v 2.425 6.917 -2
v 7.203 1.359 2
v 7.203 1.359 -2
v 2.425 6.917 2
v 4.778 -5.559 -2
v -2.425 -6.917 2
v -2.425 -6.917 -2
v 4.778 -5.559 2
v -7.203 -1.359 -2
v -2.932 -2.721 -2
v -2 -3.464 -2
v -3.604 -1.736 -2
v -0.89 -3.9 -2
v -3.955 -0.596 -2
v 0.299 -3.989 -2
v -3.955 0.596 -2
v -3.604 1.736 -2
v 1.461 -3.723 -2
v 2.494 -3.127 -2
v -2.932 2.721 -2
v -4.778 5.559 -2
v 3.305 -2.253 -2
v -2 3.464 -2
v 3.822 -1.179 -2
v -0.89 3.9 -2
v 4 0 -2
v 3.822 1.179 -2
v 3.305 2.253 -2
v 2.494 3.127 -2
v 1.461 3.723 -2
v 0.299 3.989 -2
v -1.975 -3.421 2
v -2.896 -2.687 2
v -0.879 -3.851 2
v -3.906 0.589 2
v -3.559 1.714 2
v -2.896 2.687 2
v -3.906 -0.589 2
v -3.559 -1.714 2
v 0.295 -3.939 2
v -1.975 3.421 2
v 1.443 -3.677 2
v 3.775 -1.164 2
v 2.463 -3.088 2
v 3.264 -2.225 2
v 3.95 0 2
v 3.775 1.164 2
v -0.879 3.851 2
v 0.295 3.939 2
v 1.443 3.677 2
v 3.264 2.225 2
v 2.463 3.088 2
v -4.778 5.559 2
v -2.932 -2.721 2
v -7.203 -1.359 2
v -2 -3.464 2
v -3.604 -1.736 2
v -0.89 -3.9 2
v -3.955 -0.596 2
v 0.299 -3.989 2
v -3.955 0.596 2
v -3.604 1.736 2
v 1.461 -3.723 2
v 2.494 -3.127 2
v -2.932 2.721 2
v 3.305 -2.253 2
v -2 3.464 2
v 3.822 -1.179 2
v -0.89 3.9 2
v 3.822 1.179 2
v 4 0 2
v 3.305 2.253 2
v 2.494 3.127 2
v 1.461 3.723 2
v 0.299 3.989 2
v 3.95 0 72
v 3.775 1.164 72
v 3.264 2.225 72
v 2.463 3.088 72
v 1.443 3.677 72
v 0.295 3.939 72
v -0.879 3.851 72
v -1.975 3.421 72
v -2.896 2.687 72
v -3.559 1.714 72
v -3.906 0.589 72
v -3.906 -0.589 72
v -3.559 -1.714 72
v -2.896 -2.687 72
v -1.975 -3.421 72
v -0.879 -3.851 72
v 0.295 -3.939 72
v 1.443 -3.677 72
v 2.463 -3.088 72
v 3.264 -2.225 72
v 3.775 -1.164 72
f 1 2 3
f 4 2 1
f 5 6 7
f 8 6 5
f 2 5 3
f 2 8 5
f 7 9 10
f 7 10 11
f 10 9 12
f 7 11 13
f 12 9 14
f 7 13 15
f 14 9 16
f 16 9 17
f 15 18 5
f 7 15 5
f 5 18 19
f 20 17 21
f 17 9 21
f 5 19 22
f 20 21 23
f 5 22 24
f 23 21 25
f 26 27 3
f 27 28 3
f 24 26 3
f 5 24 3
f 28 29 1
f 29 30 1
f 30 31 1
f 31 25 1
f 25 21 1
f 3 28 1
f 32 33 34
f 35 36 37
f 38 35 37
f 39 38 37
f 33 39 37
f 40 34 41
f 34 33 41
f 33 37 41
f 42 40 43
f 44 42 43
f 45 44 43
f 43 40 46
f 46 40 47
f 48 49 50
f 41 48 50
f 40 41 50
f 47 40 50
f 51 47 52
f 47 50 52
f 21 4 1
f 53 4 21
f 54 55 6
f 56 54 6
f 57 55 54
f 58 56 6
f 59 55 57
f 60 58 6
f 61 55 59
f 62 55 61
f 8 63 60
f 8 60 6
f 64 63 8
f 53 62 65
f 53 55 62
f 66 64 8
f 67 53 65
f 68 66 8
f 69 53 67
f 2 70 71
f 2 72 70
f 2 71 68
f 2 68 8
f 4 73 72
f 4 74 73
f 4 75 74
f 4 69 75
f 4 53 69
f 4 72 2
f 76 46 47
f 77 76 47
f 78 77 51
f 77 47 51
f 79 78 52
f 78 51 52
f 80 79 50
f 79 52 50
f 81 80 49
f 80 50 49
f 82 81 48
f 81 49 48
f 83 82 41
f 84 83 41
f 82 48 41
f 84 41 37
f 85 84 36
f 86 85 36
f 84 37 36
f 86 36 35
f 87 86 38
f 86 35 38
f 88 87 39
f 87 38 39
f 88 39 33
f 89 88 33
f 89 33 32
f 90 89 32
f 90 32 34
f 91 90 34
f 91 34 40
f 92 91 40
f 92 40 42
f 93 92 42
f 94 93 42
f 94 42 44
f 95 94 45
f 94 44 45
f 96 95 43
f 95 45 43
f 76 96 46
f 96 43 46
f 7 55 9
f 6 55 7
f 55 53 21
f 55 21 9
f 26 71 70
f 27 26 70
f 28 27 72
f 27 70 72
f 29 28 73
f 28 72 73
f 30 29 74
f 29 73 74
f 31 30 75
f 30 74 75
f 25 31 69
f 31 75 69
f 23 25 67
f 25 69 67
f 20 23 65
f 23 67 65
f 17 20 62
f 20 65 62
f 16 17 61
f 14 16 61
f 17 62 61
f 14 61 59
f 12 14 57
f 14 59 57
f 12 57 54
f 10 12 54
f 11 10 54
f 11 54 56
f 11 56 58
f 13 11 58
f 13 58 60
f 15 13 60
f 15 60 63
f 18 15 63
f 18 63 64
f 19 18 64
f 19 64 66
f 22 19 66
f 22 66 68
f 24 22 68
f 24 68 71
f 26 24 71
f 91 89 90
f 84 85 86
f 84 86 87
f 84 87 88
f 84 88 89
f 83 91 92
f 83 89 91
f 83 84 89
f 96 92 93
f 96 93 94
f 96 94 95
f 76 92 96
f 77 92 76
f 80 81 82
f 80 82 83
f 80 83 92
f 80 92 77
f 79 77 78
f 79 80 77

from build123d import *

# Parameters (mm, degrees)
F1_DEPTH = 2
F2_R     = 4
F3_DEPTH = 25
F4_R     = 3.95
F5_DEPTH = 70


with BuildPart() as f1:
    # F0 (on Top) → F1 (new body, symmetric)
    with BuildSketch(Plane.XY):
        Polygon((2.425009, 6.917242), (-4.778003, 5.55874), (-7.203011, -1.358502), (-2.425009, -6.917242), (4.778003, -5.55874), (7.203011, 1.358502), align=None)
    extrude(amount=F1_DEPTH, both=True)

    # F2 (on face) → F3 (cut)
    with BuildSketch(Plane.XY.offset(2)):
        Circle(F2_R)
    extrude(amount=-F3_DEPTH, mode=Mode.SUBTRACT)


with BuildPart() as f5:
    # F4 (on face) → F5 (new body)
    with BuildSketch(Plane.XY.offset(2)):
        Circle(F4_R)
    extrude(amount=F5_DEPTH)


solid = Compound([f1.part, f5.part])
